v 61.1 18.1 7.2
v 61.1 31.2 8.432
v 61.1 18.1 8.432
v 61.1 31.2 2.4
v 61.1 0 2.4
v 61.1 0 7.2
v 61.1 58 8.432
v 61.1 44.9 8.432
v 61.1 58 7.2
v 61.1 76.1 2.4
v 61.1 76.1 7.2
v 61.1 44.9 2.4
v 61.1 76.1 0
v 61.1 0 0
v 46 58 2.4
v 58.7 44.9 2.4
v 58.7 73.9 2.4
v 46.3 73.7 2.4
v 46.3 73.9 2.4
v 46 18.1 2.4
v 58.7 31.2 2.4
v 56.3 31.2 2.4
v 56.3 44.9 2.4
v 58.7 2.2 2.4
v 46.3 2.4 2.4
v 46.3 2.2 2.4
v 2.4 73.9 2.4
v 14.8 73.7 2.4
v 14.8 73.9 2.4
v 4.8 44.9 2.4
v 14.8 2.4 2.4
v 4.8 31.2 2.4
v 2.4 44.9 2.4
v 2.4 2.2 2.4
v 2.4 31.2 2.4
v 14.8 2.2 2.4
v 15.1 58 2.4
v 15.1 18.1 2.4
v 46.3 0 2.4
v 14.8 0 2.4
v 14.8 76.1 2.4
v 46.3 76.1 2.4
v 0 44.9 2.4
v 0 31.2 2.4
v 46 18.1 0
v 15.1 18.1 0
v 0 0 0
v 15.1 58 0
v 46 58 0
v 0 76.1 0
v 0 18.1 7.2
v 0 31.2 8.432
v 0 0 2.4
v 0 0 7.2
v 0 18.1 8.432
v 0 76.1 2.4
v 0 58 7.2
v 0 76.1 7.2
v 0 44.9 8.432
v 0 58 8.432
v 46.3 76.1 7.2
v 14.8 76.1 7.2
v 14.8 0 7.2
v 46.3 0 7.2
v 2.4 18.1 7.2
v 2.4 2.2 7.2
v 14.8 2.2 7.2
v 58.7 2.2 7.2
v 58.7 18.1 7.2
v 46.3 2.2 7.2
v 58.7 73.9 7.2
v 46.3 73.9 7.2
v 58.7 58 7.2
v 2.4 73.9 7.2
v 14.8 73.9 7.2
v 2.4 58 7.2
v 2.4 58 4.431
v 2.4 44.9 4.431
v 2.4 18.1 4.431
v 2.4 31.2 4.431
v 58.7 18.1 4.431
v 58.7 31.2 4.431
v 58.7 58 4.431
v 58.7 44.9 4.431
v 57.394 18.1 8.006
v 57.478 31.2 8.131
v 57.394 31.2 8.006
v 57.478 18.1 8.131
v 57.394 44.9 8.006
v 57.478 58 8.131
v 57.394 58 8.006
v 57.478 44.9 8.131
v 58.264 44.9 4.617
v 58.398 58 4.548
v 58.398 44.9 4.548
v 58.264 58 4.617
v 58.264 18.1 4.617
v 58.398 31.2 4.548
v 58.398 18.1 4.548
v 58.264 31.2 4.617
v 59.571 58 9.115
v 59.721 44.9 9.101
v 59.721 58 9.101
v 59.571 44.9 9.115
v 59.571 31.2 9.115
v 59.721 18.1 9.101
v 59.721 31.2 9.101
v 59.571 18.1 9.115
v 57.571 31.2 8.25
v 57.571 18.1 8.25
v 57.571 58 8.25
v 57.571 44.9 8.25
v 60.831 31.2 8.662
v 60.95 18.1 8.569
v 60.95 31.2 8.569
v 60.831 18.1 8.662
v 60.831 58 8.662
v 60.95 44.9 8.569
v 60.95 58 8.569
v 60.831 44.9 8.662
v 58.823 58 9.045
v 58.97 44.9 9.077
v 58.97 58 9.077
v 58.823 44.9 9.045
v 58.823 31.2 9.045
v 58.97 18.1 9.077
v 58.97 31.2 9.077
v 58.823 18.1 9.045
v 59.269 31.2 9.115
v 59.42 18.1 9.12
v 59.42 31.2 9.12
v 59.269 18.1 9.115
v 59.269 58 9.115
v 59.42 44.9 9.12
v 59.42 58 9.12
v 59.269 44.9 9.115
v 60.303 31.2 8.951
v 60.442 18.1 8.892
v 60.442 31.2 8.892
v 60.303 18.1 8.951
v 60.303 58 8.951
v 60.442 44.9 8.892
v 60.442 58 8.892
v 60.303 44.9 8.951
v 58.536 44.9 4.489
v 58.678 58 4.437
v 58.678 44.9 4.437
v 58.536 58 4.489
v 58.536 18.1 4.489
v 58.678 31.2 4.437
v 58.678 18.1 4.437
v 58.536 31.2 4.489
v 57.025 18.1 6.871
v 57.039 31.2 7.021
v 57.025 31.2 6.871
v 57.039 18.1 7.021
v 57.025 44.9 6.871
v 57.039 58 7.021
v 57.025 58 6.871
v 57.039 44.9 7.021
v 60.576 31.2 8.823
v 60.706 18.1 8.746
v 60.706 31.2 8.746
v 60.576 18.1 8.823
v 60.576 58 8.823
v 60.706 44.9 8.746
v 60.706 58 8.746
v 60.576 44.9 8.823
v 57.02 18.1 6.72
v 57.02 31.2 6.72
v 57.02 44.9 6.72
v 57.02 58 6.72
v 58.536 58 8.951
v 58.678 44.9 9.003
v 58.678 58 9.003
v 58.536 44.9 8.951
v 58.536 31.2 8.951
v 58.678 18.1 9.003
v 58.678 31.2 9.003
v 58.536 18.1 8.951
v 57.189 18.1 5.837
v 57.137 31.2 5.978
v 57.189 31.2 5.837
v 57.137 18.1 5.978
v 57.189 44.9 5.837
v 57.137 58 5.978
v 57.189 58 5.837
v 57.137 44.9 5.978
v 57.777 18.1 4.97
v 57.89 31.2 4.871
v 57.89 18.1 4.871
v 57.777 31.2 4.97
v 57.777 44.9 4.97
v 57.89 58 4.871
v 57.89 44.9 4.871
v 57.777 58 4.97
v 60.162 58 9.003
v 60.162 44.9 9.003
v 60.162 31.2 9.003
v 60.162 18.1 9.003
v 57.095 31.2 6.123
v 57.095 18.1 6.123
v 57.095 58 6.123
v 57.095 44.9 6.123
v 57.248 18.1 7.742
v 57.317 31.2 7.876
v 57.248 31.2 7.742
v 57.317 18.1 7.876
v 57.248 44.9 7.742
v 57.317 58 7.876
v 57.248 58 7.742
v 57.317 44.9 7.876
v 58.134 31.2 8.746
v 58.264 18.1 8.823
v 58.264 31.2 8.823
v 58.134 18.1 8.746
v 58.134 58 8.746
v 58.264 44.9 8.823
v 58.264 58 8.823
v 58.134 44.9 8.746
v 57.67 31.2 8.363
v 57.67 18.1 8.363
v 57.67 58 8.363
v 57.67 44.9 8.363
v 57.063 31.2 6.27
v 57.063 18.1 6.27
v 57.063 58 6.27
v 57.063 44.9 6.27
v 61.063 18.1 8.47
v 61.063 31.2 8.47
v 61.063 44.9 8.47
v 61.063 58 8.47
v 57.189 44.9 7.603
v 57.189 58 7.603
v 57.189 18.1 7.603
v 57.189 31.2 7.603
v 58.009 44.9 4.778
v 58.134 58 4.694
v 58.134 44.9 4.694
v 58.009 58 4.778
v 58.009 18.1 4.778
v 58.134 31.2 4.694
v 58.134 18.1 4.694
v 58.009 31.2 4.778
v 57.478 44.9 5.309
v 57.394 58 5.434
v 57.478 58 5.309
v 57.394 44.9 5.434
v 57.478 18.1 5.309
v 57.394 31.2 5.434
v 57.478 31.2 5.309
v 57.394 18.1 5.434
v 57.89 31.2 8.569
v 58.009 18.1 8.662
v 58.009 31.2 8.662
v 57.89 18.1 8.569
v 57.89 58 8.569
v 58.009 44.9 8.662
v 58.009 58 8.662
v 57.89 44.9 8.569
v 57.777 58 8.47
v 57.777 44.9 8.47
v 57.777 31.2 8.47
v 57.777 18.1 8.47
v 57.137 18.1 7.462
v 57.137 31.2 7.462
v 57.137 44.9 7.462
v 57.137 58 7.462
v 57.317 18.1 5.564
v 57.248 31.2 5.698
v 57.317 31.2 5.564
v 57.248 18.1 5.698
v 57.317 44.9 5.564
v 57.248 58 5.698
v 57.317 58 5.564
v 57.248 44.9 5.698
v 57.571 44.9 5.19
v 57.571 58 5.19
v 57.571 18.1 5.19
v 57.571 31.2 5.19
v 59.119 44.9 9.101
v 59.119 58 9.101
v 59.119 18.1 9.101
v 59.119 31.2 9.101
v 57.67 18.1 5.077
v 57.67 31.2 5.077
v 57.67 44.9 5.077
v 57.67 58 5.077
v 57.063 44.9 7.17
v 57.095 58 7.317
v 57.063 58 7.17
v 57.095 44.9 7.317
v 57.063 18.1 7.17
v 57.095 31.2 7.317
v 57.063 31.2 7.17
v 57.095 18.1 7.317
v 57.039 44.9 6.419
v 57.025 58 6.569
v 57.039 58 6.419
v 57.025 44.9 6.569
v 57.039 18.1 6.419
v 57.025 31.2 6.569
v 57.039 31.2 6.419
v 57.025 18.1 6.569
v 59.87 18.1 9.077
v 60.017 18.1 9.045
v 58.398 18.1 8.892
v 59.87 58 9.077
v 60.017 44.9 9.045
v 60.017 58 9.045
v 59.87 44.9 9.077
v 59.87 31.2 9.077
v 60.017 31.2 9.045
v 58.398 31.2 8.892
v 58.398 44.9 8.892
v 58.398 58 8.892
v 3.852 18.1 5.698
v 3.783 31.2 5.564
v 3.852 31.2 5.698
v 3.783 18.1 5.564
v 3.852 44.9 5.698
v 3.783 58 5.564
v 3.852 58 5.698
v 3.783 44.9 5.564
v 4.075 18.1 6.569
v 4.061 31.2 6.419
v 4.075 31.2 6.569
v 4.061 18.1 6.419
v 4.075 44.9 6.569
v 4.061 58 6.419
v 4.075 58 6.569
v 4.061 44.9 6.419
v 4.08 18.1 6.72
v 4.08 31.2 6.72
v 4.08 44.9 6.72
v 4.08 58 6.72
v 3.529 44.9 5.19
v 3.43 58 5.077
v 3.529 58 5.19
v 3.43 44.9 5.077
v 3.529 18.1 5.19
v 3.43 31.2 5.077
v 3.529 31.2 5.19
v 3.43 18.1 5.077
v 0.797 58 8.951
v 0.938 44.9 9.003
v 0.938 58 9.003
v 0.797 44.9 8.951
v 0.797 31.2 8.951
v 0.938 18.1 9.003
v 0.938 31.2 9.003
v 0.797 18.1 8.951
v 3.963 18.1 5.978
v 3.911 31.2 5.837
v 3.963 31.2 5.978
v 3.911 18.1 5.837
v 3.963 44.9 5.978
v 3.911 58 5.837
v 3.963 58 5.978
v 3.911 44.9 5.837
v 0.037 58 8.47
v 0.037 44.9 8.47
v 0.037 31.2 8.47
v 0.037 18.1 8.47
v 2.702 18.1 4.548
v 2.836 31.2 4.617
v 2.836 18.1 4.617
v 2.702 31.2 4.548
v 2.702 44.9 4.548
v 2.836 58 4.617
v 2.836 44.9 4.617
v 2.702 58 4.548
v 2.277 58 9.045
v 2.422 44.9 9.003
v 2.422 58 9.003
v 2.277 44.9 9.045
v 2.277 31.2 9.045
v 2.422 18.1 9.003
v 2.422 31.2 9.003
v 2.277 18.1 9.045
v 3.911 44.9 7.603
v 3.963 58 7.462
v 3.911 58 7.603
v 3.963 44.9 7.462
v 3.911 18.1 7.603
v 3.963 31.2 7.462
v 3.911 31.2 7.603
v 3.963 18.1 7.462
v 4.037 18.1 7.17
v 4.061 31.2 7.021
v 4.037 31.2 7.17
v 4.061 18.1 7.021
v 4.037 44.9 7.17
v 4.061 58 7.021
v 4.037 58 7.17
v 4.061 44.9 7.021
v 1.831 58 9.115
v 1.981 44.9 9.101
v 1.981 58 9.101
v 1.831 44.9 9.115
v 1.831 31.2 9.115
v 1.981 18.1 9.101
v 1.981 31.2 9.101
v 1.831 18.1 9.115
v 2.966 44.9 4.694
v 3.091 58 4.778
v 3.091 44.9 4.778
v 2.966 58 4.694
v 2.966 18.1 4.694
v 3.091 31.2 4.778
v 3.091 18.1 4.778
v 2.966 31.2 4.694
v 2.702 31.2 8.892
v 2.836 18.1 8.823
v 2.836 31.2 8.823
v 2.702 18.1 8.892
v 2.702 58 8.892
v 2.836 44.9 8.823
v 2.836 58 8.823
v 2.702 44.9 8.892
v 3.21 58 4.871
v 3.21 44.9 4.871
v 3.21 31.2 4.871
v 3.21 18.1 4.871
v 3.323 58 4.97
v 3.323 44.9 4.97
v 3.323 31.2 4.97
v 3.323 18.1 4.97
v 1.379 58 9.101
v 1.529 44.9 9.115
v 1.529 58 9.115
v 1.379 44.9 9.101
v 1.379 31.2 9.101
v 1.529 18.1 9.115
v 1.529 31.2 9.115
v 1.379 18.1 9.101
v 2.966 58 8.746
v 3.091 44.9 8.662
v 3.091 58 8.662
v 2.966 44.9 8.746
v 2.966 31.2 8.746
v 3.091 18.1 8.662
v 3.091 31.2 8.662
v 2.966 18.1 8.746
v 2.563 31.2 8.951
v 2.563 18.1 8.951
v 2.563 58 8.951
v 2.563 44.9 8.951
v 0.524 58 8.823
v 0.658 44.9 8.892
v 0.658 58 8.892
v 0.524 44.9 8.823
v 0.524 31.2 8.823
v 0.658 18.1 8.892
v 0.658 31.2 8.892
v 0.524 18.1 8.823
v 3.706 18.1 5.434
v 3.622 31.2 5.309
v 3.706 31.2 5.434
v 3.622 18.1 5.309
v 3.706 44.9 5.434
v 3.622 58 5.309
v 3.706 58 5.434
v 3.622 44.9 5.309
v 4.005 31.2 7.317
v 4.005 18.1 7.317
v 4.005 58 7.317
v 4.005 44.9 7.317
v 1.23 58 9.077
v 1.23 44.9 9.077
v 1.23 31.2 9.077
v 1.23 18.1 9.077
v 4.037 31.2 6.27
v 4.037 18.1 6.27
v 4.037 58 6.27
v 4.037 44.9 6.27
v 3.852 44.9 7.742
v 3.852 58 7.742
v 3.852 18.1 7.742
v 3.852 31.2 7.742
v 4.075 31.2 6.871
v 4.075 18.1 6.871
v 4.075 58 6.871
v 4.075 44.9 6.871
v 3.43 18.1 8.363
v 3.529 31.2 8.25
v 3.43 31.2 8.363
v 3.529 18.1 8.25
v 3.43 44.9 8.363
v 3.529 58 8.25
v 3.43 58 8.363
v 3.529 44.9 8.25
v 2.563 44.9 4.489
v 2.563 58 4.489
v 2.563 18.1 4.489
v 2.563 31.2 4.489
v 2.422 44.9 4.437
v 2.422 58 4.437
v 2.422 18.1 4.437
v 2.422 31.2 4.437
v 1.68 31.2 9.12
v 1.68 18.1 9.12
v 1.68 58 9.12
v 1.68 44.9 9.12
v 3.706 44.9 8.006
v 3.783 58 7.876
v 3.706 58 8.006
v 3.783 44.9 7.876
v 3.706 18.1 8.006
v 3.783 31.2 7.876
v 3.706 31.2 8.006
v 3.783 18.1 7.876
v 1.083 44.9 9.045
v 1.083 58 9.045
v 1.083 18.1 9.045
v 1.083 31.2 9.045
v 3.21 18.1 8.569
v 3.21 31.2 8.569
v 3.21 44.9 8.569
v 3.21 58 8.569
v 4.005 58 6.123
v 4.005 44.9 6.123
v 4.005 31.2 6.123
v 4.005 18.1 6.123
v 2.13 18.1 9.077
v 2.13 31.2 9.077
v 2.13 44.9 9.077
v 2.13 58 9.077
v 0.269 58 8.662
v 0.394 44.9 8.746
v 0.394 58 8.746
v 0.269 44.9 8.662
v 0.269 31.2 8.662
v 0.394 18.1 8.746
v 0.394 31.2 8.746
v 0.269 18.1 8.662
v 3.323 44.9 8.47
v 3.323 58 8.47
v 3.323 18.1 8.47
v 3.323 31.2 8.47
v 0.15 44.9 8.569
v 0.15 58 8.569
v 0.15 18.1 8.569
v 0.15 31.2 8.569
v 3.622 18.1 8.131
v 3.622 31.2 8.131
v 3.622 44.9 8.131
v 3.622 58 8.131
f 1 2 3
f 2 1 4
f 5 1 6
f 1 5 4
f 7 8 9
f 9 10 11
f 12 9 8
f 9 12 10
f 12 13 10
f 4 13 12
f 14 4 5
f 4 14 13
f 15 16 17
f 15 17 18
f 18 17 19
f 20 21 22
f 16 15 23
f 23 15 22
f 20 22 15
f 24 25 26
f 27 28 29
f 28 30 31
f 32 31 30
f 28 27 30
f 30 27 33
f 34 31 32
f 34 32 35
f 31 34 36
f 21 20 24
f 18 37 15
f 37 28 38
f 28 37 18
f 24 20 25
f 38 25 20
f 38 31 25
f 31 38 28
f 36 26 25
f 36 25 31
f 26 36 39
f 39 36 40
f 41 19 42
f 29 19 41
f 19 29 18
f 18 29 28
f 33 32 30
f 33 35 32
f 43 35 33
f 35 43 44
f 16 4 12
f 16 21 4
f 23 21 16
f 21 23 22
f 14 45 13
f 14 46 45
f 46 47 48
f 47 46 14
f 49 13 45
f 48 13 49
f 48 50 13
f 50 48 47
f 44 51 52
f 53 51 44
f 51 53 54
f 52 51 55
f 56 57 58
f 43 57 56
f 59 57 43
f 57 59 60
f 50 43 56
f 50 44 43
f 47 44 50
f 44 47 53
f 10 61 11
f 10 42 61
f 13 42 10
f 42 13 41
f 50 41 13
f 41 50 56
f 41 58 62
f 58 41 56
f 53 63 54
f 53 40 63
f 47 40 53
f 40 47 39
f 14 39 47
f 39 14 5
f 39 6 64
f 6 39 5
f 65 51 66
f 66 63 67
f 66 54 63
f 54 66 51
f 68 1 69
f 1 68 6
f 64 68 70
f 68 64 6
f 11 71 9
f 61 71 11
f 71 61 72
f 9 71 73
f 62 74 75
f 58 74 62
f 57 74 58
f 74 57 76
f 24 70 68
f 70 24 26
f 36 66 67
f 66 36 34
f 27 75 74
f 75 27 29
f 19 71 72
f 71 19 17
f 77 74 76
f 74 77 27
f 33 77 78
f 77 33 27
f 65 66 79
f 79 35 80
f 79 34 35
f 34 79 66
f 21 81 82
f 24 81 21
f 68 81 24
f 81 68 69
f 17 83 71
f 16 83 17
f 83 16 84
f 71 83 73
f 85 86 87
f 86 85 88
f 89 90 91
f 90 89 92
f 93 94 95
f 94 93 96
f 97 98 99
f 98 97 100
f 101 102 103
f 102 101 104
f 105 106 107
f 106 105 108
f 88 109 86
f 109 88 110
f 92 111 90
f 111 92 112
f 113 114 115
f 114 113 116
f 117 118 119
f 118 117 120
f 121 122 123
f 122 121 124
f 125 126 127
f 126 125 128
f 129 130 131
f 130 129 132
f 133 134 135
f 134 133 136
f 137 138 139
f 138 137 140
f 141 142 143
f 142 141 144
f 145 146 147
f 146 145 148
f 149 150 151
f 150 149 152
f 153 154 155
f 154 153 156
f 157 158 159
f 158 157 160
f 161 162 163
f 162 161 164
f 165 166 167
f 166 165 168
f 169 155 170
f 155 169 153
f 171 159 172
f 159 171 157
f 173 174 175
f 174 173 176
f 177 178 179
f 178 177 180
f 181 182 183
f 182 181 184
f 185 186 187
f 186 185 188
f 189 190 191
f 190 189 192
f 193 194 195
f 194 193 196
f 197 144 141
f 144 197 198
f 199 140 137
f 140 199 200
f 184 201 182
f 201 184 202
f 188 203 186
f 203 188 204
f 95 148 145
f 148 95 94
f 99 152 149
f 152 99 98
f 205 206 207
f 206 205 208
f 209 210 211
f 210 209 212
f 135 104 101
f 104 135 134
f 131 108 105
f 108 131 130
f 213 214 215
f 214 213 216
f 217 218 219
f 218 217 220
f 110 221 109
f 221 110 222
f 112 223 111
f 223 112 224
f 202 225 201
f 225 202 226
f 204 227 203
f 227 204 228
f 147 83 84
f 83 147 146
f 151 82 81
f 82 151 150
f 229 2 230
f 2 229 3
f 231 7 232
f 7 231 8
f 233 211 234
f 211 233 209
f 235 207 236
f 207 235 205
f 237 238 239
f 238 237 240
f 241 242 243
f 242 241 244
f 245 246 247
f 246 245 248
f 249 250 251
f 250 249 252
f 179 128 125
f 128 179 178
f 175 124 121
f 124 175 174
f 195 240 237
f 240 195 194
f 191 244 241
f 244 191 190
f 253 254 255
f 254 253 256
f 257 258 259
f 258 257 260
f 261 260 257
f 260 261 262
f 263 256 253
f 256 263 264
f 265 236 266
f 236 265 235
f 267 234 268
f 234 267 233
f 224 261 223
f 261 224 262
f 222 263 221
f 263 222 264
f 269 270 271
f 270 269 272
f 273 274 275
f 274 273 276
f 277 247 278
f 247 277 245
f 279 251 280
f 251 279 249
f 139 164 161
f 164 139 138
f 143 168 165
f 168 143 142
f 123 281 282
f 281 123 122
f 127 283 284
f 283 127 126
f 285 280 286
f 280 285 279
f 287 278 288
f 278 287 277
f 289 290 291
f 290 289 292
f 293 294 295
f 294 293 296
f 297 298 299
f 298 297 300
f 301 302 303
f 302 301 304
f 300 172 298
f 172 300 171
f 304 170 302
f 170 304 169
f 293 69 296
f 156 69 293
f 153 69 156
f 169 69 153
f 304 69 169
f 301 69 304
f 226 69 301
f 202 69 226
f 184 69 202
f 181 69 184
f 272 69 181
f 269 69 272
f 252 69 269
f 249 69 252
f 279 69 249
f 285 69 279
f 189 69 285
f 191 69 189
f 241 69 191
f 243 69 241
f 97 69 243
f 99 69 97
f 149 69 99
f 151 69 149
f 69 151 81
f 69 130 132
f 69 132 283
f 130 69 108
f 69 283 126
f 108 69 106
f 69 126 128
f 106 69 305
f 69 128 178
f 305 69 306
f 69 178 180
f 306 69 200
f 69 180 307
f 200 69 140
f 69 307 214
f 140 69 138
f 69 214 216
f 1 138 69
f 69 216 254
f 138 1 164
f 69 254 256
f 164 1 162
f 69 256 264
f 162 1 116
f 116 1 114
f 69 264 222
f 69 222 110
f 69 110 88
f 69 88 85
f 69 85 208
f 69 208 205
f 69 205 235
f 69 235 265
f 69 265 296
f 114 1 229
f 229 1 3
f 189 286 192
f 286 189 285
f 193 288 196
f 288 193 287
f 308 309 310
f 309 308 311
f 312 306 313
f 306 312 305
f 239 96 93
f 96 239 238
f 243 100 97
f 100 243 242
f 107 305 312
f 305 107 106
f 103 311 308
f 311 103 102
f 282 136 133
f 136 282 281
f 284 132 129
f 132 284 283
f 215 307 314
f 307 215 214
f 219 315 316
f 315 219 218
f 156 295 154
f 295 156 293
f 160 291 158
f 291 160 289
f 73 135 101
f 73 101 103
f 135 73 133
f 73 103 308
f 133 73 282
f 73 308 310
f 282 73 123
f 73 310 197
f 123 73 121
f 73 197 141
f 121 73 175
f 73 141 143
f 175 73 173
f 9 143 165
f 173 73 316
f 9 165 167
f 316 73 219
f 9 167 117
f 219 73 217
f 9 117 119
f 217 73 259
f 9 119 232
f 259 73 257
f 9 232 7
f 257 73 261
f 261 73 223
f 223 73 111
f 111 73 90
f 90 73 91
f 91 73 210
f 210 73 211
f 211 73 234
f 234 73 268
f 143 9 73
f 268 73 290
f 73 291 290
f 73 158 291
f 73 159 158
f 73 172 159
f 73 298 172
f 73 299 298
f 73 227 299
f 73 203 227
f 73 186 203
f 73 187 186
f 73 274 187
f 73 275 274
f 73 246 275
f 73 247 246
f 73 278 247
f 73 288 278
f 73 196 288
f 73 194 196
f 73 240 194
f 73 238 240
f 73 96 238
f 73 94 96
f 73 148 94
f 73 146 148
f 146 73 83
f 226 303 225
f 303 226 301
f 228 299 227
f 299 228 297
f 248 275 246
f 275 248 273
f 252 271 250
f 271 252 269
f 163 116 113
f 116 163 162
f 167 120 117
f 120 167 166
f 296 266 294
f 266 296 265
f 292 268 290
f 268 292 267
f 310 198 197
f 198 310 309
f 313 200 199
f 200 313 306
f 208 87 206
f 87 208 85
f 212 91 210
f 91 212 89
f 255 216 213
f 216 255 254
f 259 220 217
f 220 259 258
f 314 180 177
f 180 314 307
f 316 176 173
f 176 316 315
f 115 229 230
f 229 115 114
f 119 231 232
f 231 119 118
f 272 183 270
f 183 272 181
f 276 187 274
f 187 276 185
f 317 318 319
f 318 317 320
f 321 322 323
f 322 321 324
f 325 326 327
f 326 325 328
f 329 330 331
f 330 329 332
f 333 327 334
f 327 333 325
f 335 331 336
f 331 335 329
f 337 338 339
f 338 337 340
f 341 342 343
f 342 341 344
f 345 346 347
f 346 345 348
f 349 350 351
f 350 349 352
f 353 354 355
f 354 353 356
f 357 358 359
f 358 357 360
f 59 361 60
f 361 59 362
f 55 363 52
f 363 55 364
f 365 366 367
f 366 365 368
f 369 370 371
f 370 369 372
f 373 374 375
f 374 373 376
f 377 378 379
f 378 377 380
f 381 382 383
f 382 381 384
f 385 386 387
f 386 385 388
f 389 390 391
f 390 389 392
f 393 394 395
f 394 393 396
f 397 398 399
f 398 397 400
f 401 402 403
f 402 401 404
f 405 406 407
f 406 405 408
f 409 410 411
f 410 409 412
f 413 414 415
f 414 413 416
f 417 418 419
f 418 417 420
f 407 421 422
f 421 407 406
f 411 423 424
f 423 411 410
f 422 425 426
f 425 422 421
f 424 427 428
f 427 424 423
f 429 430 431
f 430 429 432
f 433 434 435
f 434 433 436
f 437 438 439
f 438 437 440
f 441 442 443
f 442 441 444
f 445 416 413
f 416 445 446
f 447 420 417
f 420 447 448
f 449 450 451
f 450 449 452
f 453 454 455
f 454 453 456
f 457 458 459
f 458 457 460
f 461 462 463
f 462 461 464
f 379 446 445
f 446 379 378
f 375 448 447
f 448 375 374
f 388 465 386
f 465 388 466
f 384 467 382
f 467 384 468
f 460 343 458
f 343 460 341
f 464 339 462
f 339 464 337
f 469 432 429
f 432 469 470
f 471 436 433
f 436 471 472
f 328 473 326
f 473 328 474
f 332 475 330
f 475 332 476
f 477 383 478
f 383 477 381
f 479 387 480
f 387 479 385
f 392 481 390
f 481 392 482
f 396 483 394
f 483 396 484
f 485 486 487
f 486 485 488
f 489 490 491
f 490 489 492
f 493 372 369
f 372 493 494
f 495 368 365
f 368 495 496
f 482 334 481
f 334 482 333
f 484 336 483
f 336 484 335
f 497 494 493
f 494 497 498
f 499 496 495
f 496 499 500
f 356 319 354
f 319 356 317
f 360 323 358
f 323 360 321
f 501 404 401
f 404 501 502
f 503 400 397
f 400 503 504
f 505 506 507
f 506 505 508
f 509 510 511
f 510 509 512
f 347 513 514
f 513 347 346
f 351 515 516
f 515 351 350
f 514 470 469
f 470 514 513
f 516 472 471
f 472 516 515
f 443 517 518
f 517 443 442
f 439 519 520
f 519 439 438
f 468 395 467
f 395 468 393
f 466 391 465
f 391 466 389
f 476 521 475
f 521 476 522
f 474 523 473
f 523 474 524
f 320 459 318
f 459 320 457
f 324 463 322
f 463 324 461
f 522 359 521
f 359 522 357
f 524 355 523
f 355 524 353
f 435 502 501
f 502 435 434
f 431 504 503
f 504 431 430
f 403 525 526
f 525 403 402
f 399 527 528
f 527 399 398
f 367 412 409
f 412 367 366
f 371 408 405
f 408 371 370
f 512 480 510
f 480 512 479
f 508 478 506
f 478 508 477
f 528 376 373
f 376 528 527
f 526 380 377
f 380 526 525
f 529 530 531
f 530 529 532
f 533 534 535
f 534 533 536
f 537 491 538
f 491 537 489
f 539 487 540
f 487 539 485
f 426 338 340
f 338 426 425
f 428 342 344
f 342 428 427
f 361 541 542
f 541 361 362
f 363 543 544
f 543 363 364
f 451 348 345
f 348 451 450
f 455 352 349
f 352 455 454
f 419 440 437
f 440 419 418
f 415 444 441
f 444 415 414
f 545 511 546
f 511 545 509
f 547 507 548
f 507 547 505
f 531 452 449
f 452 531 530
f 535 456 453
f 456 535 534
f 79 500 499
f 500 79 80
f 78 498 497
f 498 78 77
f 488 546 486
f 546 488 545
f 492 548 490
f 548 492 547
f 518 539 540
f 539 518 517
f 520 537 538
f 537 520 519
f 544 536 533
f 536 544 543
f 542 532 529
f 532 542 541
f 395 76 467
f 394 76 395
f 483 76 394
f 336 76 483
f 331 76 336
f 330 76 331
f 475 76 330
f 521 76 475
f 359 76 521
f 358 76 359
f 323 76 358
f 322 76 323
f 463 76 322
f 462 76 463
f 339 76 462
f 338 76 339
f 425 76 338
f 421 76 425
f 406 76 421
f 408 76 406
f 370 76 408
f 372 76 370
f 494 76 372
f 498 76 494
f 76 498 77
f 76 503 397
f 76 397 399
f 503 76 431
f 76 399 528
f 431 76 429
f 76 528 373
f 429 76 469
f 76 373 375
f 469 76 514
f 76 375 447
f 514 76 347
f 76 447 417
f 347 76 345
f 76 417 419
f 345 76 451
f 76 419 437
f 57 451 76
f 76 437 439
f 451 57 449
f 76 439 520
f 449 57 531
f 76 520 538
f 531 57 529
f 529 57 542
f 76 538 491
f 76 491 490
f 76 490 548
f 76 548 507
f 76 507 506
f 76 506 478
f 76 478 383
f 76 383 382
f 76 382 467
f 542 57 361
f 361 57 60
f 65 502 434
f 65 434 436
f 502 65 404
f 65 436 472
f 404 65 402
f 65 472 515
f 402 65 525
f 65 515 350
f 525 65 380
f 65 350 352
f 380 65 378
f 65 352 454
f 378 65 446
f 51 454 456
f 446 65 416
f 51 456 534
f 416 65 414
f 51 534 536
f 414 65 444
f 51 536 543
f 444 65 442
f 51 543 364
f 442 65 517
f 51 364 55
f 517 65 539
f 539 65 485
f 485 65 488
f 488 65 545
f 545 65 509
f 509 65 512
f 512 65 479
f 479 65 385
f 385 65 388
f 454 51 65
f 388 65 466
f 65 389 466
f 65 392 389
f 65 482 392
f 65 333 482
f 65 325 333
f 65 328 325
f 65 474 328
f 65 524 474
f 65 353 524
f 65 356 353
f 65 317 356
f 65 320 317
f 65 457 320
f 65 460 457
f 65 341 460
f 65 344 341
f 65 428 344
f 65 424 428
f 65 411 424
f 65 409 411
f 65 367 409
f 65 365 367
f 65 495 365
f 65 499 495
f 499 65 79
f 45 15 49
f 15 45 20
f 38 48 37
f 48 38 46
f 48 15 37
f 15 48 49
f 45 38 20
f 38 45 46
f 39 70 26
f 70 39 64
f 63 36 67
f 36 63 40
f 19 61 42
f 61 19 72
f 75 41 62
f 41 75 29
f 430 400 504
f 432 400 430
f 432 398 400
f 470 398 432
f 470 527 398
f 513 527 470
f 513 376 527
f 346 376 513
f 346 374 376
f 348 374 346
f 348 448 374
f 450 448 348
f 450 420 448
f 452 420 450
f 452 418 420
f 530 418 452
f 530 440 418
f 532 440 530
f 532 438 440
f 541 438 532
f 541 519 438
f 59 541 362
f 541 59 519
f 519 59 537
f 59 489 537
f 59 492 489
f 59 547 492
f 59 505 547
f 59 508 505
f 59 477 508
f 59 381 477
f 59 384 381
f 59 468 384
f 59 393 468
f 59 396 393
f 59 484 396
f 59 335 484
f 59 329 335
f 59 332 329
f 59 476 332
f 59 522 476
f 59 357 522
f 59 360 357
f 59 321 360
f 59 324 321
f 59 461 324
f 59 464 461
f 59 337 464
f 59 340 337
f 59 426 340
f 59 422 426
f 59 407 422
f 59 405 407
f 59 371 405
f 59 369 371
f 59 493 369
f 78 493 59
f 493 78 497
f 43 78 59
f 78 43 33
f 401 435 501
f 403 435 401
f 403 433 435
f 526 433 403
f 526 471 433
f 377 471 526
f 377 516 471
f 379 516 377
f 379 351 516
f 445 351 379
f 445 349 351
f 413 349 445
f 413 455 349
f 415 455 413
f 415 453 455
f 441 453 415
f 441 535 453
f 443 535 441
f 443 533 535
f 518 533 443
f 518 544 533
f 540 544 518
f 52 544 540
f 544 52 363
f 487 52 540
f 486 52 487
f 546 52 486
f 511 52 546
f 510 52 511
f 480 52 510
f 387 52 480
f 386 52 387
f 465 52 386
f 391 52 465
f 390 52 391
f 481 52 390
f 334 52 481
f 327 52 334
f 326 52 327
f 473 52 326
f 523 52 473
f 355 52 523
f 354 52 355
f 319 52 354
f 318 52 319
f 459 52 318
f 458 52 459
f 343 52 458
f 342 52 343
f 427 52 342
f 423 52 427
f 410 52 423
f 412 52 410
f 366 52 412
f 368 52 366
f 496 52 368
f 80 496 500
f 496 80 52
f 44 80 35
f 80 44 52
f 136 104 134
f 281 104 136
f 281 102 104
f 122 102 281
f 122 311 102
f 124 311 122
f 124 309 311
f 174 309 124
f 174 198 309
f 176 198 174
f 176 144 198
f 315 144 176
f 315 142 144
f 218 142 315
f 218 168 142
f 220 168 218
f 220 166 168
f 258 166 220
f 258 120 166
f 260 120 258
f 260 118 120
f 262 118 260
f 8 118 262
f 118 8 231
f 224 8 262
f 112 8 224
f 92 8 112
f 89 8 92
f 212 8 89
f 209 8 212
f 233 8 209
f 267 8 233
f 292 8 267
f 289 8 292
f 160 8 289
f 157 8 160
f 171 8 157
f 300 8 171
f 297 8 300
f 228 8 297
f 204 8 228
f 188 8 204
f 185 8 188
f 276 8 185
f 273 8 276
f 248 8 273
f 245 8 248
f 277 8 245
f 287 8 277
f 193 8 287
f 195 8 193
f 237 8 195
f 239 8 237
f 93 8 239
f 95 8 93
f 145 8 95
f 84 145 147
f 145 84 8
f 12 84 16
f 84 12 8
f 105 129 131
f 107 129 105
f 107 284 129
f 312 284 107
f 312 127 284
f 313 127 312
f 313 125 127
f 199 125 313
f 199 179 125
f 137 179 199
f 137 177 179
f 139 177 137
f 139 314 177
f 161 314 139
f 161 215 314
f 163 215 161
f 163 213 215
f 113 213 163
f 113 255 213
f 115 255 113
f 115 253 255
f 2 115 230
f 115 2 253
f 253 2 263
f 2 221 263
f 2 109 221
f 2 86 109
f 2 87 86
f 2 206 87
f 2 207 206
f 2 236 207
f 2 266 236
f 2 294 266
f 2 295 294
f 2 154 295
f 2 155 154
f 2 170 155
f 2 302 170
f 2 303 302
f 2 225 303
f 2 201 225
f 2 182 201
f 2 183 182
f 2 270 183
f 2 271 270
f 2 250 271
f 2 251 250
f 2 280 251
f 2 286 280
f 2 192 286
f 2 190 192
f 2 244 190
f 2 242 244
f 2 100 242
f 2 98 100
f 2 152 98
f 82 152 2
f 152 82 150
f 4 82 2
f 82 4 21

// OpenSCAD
// Written by xoque (mwifall@gmail.com)
/**************************************
Custom Escape organizer lid for curses/character tiles
**************************************/

ChamberWidth=100;
ChamberHeight=75;
CurseLength=65;
CurseWidth=50;
CurseHeight=50;
TreasureWidth=30.1;
TreasureHeight=40;

lid(CurseWidth,CurseLength,1.5,2.4,5);

module lid(LidWidth,LidLength, tol, Thickness, Edge)
{
    LidWidth=LidWidth+tol;
    LidLength=LidLength+tol;
    
    difference(){
        union(){
            //bottom structure
            cube([LidWidth+4*Thickness,LidLength+4*Thickness,Thickness]);
            
            //bottom and top walls
            translate([0,0,Thickness]) cube([LidWidth+Thickness*4,Thickness-.2,2*Thickness]);
            translate([0,LidLength+3*Thickness+.2,Thickness]) cube([LidWidth+Thickness*4,Thickness-.2,2*Thickness]);
            
            //side walls
            translate([0,0,Thickness]) cube([Thickness,LidLength+Thickness*4,2*Thickness]);
            translate([LidWidth+Thickness*3,0,Thickness]) cube([Thickness,LidLength+Thickness*4,2*Thickness]);

            //cylinders on side walls
            translate([LidWidth+4*Thickness-Thickness*0.7,2*Thickness+LidLength/5,4.5*Thickness-Thickness*1.7]) rotate([270,0,0]) cylinder($fn = 100, r = Thickness, h = 3*LidLength/5);
            translate([Thickness*0.7,2*Thickness+LidLength/5,4.5*Thickness-Thickness*1.7]) rotate([270,0,0]) cylinder($fn = 100, r = Thickness, h = 3*LidLength/5);
            }
    //Subtraction
    //hole in middle
    translate([0.2*LidWidth+2*Thickness, 0.2*LidLength+2*Thickness, 0]) cube([0.6*LidWidth, 0.6*LidLength, Thickness]);
    
    //Removing cutouts in top and bottom (non cylinder edges)
    translate([2*Edge+2*Thickness,0,Thickness]) cube([LidWidth-4*Edge,Thickness,2*Thickness]);
    translate([2*Edge+2*Thickness,LidLength+3*Thickness,Thickness]) cube([LidWidth-4*Edge,Thickness,3*Thickness]);

    //Removing cutouts in between cylinders
    translate([0,2*Thickness+2*LidLength/5-.2,Thickness]) cube([2*Thickness,LidLength/5+.4,3*Thickness]);
    translate([LidWidth+Thickness*2,2*Thickness+2*LidLength/5-.2,Thickness]) cube([2*Thickness,LidLength/5+.4,3*Thickness]);

    //Removing outside edges of cylinders
    translate([-Thickness,0,Thickness]) cube([Thickness,LidLength+Thickness*4,4*Thickness]);
    translate([LidWidth+Thickness*4,0,Thickness]) cube([Thickness,LidLength+Thickness*4,4*Thickness]);
}
}
